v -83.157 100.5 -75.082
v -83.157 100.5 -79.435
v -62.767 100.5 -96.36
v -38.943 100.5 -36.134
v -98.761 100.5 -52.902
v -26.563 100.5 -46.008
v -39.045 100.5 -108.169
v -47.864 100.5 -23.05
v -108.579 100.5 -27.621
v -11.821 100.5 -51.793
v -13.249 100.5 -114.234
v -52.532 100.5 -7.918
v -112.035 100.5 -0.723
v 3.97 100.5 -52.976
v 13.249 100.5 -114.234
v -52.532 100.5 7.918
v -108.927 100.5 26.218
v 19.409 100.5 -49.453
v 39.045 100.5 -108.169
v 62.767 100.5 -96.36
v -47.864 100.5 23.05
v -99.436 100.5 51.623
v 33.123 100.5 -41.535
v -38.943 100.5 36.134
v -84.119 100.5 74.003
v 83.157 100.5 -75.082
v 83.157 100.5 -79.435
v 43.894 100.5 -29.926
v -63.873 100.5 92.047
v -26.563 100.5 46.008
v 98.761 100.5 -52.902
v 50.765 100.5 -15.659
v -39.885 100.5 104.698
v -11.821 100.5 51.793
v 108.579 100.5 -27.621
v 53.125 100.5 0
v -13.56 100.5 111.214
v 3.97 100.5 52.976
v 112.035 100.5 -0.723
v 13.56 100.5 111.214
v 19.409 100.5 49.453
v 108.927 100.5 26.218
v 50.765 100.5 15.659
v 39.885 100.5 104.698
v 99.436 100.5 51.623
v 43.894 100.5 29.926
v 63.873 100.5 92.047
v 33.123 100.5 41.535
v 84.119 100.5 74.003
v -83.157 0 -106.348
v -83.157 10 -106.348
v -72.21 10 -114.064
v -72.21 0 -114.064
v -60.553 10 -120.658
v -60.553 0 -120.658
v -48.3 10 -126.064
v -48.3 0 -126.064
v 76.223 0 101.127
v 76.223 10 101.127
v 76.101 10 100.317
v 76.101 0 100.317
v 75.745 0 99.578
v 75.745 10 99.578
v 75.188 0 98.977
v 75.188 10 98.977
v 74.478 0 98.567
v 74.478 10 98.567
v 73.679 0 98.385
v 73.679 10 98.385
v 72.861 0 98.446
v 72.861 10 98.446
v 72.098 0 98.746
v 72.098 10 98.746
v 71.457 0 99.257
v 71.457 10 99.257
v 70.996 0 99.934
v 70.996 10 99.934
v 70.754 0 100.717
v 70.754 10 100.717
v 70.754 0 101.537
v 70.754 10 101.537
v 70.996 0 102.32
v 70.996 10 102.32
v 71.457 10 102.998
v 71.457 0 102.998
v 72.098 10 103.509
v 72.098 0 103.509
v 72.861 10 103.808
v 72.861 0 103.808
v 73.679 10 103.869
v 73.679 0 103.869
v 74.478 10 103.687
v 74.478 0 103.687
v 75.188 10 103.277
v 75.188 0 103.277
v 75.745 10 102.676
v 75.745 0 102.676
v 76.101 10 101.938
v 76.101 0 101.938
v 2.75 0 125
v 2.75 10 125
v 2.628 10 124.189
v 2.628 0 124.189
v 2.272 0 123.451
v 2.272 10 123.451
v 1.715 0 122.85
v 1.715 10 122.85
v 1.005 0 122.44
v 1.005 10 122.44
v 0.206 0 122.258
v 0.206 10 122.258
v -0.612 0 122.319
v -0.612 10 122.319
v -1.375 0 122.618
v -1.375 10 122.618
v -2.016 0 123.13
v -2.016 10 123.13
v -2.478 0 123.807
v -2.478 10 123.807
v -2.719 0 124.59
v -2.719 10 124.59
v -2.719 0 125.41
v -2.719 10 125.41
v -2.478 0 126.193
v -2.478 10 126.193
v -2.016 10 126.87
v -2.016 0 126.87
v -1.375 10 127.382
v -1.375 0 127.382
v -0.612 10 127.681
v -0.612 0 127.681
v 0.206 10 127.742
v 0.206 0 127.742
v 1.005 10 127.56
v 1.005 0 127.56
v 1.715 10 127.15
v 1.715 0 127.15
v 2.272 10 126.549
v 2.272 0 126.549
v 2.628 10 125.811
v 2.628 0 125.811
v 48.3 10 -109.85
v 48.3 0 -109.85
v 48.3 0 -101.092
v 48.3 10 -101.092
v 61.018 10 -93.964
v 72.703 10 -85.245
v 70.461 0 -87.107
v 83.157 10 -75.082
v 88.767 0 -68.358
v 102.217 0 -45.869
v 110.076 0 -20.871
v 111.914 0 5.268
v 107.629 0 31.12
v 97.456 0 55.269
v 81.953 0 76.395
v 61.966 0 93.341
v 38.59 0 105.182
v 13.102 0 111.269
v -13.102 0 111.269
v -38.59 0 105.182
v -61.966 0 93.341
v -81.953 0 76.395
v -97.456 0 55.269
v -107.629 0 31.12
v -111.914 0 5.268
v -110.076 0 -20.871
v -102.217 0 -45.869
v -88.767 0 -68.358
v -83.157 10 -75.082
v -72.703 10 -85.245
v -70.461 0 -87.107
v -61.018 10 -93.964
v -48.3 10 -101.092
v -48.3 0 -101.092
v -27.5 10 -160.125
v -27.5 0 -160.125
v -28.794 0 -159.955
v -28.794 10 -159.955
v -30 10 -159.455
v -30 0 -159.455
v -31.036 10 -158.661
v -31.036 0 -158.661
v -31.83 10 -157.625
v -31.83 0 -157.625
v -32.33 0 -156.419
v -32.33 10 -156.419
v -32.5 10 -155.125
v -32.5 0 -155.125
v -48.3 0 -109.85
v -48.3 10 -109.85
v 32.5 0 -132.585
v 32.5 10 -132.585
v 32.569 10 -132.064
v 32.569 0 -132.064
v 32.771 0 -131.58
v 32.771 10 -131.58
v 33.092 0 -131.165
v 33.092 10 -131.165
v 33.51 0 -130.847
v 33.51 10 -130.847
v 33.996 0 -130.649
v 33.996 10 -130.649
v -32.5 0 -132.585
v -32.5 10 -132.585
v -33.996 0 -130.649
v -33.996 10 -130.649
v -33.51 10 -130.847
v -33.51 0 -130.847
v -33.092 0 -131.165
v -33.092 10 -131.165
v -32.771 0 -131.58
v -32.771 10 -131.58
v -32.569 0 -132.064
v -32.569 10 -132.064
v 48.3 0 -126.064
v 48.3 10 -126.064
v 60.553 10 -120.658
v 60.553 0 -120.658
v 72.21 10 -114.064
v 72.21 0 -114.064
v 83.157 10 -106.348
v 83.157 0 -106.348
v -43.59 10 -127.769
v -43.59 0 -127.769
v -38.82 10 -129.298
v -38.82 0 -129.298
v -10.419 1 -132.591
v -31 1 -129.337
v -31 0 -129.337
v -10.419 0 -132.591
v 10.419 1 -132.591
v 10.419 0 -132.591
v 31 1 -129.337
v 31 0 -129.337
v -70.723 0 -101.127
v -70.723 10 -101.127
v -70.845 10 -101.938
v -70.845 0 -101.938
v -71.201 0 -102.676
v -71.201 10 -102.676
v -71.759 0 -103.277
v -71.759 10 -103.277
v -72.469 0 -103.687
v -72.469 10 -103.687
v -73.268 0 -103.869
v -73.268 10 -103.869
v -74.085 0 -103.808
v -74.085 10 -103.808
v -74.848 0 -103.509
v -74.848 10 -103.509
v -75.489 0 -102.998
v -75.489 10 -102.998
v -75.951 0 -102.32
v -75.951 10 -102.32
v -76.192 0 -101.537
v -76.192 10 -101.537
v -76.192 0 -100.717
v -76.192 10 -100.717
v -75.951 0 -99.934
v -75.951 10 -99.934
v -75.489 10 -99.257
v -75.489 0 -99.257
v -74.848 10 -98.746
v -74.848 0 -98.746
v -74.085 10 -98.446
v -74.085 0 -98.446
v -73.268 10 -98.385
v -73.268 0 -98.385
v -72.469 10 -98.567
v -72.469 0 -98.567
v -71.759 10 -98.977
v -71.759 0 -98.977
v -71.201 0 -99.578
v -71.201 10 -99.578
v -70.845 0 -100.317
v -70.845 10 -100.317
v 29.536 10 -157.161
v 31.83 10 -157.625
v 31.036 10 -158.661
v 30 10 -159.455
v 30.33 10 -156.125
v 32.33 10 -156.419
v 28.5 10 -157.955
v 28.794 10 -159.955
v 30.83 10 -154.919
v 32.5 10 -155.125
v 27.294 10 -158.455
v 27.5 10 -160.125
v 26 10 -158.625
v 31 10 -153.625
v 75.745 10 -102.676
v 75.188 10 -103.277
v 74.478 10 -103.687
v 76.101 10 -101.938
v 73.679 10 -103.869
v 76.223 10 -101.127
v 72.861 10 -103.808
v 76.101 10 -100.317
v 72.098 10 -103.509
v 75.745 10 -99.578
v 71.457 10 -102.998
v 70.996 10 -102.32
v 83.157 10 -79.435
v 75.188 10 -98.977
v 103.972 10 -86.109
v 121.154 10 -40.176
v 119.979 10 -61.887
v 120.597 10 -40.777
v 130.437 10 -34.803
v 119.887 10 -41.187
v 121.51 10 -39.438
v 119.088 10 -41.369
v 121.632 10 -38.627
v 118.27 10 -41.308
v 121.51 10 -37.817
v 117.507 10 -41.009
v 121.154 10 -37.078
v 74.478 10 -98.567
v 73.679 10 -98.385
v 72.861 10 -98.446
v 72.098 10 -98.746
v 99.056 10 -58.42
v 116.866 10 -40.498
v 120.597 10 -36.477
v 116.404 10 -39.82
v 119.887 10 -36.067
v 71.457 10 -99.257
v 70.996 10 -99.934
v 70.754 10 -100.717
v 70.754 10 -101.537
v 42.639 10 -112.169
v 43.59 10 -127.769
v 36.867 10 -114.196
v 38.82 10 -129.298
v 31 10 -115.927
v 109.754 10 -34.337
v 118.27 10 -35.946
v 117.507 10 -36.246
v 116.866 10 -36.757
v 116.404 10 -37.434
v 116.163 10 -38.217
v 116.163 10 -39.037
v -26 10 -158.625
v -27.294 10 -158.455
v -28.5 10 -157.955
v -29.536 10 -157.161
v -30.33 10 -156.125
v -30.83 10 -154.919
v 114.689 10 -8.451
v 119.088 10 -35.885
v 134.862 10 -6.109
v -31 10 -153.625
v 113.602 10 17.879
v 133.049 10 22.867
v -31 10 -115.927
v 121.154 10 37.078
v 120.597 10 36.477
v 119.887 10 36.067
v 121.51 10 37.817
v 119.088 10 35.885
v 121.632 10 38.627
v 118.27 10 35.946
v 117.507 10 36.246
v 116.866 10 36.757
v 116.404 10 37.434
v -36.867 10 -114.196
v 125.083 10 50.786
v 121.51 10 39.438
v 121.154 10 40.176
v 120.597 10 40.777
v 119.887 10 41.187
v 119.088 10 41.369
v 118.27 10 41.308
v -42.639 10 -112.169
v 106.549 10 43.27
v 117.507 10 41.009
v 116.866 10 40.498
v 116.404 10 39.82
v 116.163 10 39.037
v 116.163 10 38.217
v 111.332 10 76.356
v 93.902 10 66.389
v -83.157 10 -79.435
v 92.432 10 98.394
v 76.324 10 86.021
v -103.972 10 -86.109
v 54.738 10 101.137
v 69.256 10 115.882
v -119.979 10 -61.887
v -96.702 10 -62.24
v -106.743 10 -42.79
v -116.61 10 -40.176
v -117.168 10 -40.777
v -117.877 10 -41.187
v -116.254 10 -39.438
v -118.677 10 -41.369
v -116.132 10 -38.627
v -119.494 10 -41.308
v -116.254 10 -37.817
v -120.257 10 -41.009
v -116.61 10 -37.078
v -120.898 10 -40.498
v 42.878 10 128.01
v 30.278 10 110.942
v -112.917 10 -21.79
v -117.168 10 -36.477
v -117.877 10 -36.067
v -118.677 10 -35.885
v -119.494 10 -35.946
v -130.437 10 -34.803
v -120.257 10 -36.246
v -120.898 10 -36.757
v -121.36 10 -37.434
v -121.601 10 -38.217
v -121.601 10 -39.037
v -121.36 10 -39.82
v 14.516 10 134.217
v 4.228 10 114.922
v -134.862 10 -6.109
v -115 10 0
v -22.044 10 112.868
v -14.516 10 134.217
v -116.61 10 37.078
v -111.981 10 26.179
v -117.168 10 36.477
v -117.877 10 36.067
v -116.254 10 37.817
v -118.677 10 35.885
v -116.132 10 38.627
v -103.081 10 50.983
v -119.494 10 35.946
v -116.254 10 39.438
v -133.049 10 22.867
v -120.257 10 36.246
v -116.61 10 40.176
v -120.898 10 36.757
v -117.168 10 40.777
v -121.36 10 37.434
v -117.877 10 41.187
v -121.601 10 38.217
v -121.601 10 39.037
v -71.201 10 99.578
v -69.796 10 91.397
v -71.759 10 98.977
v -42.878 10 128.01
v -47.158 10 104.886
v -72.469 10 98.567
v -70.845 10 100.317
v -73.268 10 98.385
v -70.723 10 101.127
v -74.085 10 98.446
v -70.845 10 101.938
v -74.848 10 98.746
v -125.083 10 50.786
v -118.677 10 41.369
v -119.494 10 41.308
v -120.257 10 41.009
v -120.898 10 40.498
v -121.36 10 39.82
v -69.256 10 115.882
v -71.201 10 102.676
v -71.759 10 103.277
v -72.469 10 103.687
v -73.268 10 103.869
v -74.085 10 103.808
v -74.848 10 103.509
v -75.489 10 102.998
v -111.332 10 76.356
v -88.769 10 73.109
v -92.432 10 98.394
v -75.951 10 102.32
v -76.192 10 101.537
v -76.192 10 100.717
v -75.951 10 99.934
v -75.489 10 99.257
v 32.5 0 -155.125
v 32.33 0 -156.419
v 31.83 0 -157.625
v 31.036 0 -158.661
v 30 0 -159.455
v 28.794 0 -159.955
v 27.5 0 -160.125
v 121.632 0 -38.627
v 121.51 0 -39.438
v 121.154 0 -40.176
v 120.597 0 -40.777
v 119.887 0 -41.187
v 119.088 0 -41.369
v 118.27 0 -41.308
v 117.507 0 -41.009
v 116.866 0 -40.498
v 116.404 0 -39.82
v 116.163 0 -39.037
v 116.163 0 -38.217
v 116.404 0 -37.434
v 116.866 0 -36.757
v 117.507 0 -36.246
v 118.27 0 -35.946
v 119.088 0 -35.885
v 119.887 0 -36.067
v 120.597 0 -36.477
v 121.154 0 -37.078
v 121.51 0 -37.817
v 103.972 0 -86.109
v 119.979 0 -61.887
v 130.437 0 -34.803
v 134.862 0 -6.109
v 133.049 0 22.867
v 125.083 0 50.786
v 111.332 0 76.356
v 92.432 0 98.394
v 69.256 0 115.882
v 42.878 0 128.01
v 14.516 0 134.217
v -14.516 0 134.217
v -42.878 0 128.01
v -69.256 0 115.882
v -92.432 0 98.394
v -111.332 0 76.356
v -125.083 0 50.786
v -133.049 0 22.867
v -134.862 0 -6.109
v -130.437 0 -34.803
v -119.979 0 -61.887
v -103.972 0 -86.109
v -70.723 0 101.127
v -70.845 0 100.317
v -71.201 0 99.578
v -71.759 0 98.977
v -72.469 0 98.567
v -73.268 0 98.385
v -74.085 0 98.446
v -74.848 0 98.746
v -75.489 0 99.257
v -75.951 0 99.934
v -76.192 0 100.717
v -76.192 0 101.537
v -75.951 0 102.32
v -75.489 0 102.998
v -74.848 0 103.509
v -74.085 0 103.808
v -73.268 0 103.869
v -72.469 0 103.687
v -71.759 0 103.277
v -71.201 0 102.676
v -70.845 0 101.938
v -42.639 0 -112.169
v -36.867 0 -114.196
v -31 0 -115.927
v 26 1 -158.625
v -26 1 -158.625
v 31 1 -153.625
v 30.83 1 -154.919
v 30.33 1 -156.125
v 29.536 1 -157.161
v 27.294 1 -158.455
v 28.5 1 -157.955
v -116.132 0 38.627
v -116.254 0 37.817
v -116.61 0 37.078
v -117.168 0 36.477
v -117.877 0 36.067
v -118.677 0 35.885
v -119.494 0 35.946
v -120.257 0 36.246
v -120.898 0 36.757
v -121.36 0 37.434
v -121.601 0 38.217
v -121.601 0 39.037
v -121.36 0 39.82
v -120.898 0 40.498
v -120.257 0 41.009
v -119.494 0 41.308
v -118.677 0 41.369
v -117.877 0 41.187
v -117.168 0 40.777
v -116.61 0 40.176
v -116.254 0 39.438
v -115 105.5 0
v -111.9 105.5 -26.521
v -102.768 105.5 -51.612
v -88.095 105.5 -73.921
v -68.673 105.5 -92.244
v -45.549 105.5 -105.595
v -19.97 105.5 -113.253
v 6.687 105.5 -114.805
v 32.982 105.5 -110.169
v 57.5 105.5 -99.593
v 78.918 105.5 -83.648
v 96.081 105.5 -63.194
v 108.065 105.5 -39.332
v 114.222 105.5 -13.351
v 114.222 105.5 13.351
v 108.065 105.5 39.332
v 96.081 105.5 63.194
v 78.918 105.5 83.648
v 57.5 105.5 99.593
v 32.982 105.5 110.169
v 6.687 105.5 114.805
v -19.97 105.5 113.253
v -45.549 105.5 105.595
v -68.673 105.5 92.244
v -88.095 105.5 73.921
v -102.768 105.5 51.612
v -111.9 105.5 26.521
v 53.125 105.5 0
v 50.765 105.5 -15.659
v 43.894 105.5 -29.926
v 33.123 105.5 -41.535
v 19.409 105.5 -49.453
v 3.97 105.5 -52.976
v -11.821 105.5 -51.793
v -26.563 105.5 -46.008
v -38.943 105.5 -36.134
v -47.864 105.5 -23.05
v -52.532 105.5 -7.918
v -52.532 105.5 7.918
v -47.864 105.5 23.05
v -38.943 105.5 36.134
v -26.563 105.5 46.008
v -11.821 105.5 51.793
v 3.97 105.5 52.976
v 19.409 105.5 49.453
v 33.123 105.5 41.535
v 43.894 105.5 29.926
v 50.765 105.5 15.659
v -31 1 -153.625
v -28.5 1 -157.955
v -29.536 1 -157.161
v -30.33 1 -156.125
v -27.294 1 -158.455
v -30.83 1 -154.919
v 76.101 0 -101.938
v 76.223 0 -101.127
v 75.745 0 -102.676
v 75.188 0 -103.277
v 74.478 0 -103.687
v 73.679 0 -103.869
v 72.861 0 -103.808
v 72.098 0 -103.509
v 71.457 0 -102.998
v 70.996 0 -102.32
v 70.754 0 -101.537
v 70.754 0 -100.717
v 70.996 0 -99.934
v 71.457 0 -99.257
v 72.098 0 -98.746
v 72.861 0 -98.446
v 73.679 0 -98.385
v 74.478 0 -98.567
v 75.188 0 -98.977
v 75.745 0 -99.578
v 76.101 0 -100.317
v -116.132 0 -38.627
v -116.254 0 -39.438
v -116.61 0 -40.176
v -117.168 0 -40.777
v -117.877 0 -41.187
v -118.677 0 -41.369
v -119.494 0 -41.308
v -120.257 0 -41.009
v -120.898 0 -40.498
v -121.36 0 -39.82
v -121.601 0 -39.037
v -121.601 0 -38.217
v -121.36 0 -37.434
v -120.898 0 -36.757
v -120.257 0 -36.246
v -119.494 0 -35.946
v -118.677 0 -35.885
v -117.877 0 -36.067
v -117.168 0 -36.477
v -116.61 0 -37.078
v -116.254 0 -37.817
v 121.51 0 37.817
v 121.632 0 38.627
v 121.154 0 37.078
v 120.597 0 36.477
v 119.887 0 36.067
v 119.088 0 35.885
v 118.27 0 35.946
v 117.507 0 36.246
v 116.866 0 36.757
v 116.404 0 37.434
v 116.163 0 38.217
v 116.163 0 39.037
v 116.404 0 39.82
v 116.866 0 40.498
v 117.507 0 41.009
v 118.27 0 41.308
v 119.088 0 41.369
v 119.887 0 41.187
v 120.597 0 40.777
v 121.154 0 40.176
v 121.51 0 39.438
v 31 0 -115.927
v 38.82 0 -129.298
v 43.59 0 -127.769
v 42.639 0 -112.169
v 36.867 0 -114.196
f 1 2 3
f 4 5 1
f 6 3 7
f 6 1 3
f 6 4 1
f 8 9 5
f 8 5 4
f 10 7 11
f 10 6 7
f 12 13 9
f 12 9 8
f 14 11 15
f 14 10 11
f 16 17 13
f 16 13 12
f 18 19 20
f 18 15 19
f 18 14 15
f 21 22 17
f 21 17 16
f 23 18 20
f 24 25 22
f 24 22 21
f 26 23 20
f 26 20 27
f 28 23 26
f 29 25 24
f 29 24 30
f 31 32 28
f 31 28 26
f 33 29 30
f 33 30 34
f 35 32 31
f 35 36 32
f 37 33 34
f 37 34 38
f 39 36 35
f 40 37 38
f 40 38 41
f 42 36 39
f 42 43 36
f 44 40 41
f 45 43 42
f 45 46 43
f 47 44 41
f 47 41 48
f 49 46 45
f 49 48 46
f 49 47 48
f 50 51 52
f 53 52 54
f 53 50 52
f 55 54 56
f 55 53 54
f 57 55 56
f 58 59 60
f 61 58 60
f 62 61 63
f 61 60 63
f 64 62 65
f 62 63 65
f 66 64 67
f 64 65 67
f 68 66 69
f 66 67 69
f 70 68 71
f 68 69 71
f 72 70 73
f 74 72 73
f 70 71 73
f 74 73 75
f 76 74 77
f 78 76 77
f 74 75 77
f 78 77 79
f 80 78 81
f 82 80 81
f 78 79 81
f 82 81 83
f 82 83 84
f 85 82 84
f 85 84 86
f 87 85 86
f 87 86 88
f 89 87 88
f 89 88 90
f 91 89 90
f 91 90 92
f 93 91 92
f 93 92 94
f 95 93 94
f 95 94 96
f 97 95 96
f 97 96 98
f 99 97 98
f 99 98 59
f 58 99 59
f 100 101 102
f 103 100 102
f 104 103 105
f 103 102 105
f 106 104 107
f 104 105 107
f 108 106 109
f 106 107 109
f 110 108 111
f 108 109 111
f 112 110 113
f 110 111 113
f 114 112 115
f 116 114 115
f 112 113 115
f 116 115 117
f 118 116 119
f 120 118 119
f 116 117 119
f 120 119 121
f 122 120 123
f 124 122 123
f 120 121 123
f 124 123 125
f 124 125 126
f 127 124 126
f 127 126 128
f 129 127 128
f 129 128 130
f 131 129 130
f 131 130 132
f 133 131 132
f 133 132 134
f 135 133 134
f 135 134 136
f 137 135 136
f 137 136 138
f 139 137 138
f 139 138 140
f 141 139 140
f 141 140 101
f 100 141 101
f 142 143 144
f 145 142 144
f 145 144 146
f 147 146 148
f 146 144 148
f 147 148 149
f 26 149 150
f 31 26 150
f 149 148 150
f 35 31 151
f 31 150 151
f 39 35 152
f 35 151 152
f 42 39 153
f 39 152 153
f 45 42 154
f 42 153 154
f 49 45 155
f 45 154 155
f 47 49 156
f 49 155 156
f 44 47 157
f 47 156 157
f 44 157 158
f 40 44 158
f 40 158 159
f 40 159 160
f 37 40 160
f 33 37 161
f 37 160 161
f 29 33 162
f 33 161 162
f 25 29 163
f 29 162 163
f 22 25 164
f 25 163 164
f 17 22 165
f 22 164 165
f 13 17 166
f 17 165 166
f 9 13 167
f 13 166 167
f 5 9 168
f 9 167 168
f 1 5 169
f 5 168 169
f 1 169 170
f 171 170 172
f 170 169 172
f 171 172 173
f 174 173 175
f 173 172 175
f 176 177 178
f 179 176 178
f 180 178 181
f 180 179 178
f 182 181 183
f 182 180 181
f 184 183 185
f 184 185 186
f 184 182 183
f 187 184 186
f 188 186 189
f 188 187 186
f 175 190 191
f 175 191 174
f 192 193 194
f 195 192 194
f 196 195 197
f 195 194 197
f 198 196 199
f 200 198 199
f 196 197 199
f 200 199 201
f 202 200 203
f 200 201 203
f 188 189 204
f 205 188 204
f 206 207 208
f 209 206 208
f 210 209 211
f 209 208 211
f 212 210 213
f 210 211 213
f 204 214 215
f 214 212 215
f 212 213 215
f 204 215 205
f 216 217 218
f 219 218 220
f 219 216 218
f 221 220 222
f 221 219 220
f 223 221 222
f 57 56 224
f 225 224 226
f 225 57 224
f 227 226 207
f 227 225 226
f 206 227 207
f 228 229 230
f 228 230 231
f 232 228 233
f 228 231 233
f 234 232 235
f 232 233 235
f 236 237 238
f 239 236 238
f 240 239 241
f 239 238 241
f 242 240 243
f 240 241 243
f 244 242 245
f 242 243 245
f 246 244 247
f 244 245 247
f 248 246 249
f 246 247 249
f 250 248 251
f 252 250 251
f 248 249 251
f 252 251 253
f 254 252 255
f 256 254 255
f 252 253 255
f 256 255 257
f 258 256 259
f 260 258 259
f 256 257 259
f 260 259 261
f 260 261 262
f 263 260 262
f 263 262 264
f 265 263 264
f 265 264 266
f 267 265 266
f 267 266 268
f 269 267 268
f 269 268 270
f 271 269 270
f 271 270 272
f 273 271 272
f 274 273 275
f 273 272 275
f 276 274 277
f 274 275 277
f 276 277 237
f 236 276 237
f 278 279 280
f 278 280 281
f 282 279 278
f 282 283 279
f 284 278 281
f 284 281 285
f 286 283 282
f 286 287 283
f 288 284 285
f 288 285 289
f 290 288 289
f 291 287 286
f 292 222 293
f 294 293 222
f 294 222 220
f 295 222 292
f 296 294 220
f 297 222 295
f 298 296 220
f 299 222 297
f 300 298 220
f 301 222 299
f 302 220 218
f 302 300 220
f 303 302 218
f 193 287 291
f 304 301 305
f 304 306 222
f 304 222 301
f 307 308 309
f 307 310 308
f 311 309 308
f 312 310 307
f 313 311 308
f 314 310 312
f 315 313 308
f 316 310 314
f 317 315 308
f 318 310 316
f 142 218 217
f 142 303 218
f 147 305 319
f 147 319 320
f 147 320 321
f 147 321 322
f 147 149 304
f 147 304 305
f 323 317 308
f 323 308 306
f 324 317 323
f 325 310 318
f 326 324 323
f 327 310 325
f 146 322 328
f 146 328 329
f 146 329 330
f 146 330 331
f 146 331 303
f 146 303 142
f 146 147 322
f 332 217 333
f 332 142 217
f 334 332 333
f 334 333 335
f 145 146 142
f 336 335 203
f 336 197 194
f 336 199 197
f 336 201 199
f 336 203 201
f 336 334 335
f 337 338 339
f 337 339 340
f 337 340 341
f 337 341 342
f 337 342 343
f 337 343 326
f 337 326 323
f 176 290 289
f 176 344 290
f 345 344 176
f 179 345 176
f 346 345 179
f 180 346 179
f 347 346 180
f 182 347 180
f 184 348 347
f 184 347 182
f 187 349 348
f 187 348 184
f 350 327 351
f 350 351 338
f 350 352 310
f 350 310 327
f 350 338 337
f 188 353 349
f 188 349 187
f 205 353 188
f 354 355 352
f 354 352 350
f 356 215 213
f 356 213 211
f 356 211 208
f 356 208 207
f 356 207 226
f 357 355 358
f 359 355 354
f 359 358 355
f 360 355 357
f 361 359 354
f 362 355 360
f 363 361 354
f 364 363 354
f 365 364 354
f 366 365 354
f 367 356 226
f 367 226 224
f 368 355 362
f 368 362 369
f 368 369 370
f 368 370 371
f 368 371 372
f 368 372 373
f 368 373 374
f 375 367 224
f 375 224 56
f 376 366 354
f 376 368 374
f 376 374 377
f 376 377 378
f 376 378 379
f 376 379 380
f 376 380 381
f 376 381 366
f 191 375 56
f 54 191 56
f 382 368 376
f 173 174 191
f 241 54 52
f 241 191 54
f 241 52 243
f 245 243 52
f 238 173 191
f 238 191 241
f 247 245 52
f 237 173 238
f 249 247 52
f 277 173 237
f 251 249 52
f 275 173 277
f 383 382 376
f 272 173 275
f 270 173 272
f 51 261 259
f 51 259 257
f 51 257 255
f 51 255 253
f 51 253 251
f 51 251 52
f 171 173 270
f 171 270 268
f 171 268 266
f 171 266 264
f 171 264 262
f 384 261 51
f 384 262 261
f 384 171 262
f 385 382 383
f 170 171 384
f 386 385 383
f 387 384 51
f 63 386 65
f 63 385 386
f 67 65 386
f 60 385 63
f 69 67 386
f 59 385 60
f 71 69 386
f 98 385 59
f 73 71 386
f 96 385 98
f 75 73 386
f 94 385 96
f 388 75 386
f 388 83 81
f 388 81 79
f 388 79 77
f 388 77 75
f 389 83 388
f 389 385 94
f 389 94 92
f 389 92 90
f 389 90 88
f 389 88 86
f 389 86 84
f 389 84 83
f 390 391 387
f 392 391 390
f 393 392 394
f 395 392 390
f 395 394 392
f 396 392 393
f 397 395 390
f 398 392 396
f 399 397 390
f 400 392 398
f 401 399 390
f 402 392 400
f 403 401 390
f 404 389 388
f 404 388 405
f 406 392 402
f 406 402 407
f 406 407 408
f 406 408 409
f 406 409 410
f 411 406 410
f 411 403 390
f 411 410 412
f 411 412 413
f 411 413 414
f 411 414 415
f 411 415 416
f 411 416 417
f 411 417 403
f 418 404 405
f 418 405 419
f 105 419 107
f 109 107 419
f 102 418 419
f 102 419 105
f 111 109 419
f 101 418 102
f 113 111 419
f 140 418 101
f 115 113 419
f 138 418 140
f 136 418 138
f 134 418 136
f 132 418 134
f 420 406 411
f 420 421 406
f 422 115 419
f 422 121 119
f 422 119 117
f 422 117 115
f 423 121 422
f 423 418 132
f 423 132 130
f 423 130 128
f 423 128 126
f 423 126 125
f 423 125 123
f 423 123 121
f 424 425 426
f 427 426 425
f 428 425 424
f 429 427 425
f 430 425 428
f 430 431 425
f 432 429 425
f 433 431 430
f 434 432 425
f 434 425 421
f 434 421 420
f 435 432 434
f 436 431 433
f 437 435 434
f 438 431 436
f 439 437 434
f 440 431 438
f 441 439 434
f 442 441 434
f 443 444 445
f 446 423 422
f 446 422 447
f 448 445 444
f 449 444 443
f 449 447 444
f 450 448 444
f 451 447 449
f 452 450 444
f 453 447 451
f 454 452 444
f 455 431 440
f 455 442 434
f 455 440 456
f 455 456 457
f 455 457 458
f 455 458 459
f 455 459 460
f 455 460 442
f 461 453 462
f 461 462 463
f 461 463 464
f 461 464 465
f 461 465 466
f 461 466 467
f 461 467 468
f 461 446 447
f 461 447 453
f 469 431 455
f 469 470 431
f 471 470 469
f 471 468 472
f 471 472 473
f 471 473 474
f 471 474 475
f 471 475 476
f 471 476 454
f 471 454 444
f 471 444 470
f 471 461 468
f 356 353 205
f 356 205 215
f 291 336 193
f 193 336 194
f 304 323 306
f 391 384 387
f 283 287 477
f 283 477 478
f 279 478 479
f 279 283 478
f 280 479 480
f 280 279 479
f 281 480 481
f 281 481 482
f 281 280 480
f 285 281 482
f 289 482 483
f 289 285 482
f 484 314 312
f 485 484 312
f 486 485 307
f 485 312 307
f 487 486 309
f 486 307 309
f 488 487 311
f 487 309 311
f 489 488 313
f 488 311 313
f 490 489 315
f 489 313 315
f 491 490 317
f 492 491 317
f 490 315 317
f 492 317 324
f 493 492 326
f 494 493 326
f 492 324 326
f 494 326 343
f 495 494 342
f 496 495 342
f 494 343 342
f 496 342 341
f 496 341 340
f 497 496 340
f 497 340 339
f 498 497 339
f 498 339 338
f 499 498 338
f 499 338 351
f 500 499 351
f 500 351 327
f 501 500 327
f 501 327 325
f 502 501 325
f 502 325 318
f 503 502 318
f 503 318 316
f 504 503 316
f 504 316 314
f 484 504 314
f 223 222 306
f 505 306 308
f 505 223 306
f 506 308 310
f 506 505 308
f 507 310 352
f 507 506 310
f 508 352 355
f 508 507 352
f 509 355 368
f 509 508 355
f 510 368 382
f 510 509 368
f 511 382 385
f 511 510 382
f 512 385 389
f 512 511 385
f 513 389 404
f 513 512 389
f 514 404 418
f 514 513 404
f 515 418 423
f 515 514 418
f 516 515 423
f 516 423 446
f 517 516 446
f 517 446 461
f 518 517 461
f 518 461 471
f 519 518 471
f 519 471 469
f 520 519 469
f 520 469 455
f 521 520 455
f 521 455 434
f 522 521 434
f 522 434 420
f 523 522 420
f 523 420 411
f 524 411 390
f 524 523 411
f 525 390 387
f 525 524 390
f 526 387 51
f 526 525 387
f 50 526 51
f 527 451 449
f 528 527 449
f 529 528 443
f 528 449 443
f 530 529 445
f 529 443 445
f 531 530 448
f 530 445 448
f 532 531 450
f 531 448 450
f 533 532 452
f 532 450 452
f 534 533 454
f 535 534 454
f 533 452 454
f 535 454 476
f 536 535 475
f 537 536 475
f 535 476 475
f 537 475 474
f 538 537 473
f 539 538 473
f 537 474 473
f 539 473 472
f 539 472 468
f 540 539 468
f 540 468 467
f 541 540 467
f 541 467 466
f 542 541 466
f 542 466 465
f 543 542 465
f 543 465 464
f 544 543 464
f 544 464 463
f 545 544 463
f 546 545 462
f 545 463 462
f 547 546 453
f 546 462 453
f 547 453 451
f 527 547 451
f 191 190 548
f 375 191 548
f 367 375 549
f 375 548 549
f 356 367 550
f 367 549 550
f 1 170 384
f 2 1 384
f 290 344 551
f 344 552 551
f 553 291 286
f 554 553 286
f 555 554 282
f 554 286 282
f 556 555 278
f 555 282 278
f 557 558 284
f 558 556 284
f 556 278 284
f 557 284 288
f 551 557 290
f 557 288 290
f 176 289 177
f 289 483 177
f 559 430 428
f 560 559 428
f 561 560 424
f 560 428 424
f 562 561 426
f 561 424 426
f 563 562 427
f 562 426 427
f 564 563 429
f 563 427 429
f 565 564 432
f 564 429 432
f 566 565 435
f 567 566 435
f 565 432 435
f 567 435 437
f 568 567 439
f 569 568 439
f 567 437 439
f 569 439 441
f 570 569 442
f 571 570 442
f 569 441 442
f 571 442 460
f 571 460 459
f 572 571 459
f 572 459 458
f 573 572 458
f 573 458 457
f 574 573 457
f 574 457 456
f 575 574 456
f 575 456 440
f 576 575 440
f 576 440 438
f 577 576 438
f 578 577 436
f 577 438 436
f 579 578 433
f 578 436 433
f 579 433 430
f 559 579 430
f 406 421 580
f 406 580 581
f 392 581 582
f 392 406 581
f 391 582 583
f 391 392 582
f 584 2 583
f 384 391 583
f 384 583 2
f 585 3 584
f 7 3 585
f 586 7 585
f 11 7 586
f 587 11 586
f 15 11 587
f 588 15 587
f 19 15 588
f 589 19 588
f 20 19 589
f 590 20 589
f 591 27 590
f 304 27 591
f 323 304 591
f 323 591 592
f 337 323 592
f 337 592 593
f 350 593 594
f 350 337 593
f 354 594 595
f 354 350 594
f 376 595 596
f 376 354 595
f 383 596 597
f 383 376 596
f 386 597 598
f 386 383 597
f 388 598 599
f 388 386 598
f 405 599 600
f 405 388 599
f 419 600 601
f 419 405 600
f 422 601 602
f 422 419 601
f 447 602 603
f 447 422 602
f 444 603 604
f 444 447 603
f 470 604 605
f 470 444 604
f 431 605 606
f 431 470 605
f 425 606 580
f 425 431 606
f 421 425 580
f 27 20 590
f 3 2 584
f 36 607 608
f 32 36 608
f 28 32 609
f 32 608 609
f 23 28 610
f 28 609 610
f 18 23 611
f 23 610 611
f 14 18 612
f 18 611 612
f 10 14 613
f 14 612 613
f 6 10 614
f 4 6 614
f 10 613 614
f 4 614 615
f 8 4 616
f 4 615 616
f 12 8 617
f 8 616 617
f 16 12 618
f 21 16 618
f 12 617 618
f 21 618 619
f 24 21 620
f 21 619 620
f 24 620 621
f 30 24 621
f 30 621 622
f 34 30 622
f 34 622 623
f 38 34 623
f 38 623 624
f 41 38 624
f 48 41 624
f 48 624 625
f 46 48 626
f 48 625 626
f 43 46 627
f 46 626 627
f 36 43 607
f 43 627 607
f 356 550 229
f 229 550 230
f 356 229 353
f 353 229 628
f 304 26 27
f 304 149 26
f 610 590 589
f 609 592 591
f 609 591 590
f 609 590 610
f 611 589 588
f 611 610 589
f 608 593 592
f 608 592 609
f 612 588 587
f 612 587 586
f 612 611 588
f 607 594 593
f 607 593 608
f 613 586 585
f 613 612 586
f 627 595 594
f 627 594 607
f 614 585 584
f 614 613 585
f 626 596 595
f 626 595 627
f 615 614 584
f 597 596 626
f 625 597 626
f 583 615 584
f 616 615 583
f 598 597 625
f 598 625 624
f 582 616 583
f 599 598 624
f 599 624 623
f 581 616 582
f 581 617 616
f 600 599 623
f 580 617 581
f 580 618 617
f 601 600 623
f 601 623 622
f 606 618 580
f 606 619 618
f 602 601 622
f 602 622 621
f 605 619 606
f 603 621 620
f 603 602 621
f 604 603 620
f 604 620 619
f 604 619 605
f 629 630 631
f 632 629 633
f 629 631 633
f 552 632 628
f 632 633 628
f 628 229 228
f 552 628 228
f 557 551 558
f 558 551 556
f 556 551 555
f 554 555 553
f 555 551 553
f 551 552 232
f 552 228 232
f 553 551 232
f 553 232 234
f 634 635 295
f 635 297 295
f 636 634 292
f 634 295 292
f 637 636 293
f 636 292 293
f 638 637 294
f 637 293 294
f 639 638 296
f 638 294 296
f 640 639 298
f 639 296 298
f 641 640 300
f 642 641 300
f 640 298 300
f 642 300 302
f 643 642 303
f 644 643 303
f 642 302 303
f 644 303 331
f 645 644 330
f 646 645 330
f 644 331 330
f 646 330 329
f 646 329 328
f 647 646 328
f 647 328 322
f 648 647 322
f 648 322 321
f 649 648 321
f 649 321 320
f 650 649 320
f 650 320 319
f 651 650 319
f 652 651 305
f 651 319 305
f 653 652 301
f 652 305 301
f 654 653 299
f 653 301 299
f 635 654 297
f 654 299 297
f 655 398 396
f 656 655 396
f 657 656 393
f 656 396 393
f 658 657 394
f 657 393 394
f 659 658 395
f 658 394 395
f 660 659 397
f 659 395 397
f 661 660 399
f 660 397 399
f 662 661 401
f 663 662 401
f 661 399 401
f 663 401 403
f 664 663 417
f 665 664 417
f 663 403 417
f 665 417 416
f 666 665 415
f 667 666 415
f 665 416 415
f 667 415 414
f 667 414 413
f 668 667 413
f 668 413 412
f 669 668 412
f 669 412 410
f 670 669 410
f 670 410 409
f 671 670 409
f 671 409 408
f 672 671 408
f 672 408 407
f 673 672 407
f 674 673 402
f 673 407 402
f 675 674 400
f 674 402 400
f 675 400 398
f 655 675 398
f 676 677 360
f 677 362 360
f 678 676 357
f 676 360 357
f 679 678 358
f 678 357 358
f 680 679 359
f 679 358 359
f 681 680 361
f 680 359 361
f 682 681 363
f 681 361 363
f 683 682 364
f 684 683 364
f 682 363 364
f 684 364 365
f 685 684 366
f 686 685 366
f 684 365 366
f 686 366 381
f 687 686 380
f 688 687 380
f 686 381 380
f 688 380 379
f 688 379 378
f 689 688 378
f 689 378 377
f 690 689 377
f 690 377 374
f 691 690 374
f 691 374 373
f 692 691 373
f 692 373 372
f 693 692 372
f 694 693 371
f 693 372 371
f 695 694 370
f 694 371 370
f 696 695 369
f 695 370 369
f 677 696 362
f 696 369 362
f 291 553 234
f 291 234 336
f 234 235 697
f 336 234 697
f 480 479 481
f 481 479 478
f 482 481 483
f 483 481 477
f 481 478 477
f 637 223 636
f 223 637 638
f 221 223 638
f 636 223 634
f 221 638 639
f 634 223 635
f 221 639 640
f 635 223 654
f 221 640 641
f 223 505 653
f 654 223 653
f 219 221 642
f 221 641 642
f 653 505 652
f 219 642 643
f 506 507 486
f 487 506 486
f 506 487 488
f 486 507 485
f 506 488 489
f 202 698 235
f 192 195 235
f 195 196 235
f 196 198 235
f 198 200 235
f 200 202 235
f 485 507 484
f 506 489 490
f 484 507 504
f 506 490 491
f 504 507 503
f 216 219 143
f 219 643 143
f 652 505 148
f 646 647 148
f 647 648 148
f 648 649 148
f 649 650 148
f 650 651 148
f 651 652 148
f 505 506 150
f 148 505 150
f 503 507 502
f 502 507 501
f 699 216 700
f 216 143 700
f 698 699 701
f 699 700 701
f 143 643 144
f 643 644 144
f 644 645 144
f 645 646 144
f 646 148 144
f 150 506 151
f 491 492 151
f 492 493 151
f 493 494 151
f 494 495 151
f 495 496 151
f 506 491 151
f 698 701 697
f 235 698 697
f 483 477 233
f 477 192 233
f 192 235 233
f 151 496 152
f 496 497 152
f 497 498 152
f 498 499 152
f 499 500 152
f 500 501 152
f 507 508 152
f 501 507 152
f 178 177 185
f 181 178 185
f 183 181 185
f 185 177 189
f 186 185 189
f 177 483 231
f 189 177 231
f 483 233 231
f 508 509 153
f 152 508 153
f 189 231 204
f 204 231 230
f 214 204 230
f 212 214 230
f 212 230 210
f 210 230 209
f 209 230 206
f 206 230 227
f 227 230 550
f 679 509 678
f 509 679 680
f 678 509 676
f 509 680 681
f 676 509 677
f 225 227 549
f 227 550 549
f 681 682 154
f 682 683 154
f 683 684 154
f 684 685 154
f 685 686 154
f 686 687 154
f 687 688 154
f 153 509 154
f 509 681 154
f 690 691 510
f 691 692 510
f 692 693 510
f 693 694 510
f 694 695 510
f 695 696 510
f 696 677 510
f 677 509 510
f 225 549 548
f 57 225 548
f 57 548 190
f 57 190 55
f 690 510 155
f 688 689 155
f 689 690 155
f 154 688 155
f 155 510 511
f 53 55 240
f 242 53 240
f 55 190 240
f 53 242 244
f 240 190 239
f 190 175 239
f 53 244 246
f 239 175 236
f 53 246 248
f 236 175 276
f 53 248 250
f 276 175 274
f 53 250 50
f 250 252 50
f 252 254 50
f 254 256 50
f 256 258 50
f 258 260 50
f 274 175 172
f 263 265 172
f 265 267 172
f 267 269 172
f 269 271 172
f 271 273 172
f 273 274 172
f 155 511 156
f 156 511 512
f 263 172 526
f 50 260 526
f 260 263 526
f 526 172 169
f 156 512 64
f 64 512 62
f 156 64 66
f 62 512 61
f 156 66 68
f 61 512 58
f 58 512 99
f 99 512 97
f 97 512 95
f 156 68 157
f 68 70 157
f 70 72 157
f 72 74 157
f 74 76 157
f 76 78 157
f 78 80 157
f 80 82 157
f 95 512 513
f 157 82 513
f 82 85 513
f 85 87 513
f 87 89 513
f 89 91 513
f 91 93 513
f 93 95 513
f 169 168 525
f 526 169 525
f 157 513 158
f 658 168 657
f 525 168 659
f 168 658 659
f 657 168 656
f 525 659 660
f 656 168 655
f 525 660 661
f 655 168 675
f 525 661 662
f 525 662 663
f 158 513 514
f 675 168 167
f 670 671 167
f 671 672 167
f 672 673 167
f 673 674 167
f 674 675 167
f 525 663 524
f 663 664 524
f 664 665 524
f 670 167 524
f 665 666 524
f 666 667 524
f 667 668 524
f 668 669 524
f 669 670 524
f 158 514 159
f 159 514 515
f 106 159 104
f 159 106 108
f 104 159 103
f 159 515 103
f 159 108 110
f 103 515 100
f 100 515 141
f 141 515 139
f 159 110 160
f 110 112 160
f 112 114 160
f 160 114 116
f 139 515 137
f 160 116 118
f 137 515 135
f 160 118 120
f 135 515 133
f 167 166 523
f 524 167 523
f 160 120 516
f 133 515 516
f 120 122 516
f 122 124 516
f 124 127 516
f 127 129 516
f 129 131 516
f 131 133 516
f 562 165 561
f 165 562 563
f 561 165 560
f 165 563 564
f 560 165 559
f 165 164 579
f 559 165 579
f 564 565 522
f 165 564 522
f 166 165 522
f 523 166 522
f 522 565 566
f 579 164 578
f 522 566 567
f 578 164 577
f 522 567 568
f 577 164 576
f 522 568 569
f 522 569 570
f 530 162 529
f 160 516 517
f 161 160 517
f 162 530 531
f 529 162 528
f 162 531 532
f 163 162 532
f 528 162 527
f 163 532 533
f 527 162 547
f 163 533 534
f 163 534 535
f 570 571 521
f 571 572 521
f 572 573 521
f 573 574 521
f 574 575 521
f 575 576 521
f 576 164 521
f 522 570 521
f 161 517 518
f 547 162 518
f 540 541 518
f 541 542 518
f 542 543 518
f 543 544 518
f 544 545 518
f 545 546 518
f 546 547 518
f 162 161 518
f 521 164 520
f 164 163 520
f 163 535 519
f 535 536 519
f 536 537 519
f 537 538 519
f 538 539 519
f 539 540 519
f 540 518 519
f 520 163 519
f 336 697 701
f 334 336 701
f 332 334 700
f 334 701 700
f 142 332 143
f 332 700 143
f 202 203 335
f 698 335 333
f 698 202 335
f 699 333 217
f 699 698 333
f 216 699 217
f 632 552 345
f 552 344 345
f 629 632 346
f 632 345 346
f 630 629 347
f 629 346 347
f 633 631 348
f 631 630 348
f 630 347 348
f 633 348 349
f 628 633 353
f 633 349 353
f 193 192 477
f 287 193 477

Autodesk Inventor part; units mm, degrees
ref_plane "YZ Plane" through (0, 0, 0) normal (1, 0, 0) x (0, 1, 0)
ref_plane "XZ Plane" through (0, 0, 0) normal (0, 1, 0) x (-1, 0, 0)
ref_plane "XY Plane" through (0, 0, 0) normal (0, 0, 1) x (1, 0, 0)
sketch "Sketch1" plane through (0, 0, 0) normal (0, 1, 0) x (-1, 0, 0)
  circle A0 centre (0, 0) radius 135
  circle A1 centre (0, 0) radius 115
  circle A2 centre (0, 0) radius 112.0375
  circle A3 centre (0, 0) radius 9.5
  dimension "Absolute_Diameter" = 270
  dimension "Diameter_No_Outer_Lip" = 230
  dimension "Inner_Cylinder_Diameter" = 224.075
  dimension "Lip_Diameter" = 19
extrude "Extrusion1" add sketch "Sketch1" along normal blind 10 contours A0
extrude "Extrusion2" add sketch "Sketch1" along normal blind 105.5 contours A1
sketch "Sketch2" plane through (0, 105.5, 0) normal (0, 1, 0) x (1, 0, 0)
  circle A0 centre (0, 0) radius 115
  circle A1 centre (0, 0) radius 53.125
  dimension "Lip_Diameter_Out" = 230
  dimension "Inner_Lip_Diameter" = 106.25
extrude "Extrusion7" add sketch "Sketch2" against normal blind 5
sketch "Sketch24" plane through (0, 0, 0) normal (0, -1, 0) x (1, 0, 0)
  circle A0 centre (0, 0) radius 112.0375
  arc A1 (-85.157, -104.7535) -> (32.5, -131.0296) centre (0, 0) ccw
  circle A2 centre (0, 0) radius 133
  line L0 (-32.5, -70.125) -> (32.5, -70.125)
  line L1 (32.5, -70.125) -> (32.5, -160.125)
  line L2 (32.5, -160.125) -> (-32.5, -160.125)
  line L3 (-32.5, -160.125) -> (-32.5, -70.125)
  line L4 (-31, -158.625) -> (31, -158.625)
  line L5 (31, -158.625) -> (31, -71.625)
  line L6 (31, -71.625) -> (-31, -71.625)
  line L7 (-31, -71.625) -> (-31, -158.625)
  line L8 (-85.157, -65.125) -> (-46.3, -65.125)
  line L9 (-46.3, -65.125) -> (-46.3, -151.2985)
  line L10 (-46.3, -151.2985) -> (-85.157, -151.2985)
  line L11 (-85.157, -151.2985) -> (-85.157, -65.125)
  arc A3 (32.5, -131.0296) -> (-85.157, -104.7535) centre (0, 0) ccw
  line L12 (0, -71.625) -> (0, -158.625)
  line L13 (-83.157, -149.2985) -> (-48.3, -149.2985)
  line L14 (-48.3, -149.2985) -> (-48.3, -67.125)
  line L15 (-48.3, -67.125) -> (-83.157, -67.125)
  line L16 (-83.157, -67.125) -> (-83.157, -149.2985)
  line L17 (85.157, -65.125) -> (46.3, -65.125)
  line L18 (46.3, -65.125) -> (46.3, -151.2985)
  line L19 (46.3, -151.2985) -> (85.157, -151.2985)
  line L20 (85.157, -151.2985) -> (85.157, -65.125)
  line L21 (83.157, -149.2985) -> (48.3, -149.2985)
  line L22 (48.3, -149.2985) -> (48.3, -67.125)
  line L23 (48.3, -67.125) -> (83.157, -67.125)
  line L24 (83.157, -67.125) -> (83.157, -149.2985)
  circle A4 centre (0, 0) radius 120
  line L25 (-135, 0) -> (135, 0)
  point P0 (0, -135)
  point P1 (48.3, -126.0639)
  point P2 (83.157, -106.3481)
  point P3 (-31, -131.3925)
  point P4 (31, -131.3925)
  point P5 (-83.157, -106.3481)
  point P6 (-48.3, -126.0639)
  point P7 (46.3, -126.8121)
  point P8 (85.157, -104.7535)
  point P9 (-32.5, -131.0296)
  point P10 (-46.3, -126.8121)
  point P11 (48.3, -109.8504)
  point P12 (48.3, -101.0916)
  point P13 (31, -107.6634)
  point P14 (31, -115.9267)
  point P15 (-48.3, -109.8504)
  point P16 (-31, -115.9267)
  point P17 (-31, -107.6634)
  point P18 (-48.3, -101.0916)
  point P19 (83.157, -75.0821)
  point P20 (-83.157, -75.0821)
  point P21 (32.5, -115.5152)
  point P22 (-32.5, -115.5152)
  point P23 (31, -129.3368)
  point P24 (-31, -129.3368)
  dimension "d234" = 2
  dimension "d235" = 65
  dimension "d237" = 1.5
  dimension "d238" = 65.125
  dimension "d240" = 20.9625
  dimension "d241" = 270
  dimension "d242" = 70.125
  dimension "d243" = 13.8
  dimension "d244" = 38.857
  dimension "d247" = 2
  dimension "d248" = 90
  dimension "d253" = 240
extrude "Extrusion30" cut sketch "Sketch24" against normal up to surface (100.5 mm away) contours L24 A4 L22 A0 | A0 L22 L23 L24 | L16 L15 L14 A0 | A0 L14 A4 L16 | L24 A2 L22 A4 | A4 L14 A2 L16 | L24 A3 L22 A2 | A2 L14 A1 L16 | L5 A4 L12 A0 | A0 L12 L6 L5 | L7 L6 L12 A0 | A0 L12 A4 L7 | L5 A2 L12 A4 | A4 L12 A2 L7 | L5 A1 L12 A2 | A2 L12 A1 L7
extrude "Extrusion31" add sketch "Sketch24" against normal up to surface (10 mm away) contours L24 A4 L22 A0 | A0 L14 A4 L16 | L24 A2 L22 A4 | A4 L14 A2 L16 | L24 A3 L22 A2 | A2 L14 A1 L16 | L1 L2 L3 A1 L7 L4 L5
extrude "Extrusion32" cut sketch "Sketch24" against normal up to surface (100.5 mm away) contours L22 A4 L18 A0 | A0 L9 A4 L14 | L18 A4 L1 A0 | A0 L3 A4 L9 | L1 A4 L5 A0 | A0 L7 A4 L3
extrude "Extrusion35" add sketch "Sketch24" against normal blind 1 contours L1 A2 L5 A4 | A4 L7 A2 L3 | L1 A1 L5 A2 | A2 L7 A1 L3 | L5 A1 L12 A2 | L1 L2 L3 A1 L7 L4 L5 | A2 L12 A1 L7 | L5 L4 L12 A1 | A1 L12 L4 L7
fillet "Fillet19" radius 5 4 edges at (32.5, 0.5, -160.125) (31, 5.5, -158.625) (-32.5, 0.5, -160.125) (-31, 5.5, -158.625)
fillet "Fillet20" radius 2 4 edges at (-32.5, 5.5, -131.0296) (-32.5, 0.5, -131.0296) (32.5, 5.5, -131.0296) (32.5, 0.5, -131.0296)
sketch "Sketch27" plane through (0, 10, 0) normal (0, 1, 0) x (1, 0, 0)
  circle A0 centre (0, 0) radius 125
  circle A1 centre (0, 125) radius 2.75
  circle A2 centre (-73.4732, 101.1271) radius 2.75
  circle A3 centre (-118.8821, 38.6271) radius 2.75
  circle A4 centre (-118.8821, -38.6271) radius 2.75
  circle A5 centre (-73.4732, -101.1271) radius 2.75
  circle A6 centre (0, -125) radius 2.75
  circle A7 centre (73.4732, -101.1271) radius 2.75
  circle A8 centre (118.8821, -38.6271) radius 2.75
  circle A9 centre (118.8821, 38.6271) radius 2.75
  circle A10 centre (73.4732, 101.1271) radius 2.75
  dimension "d276" = 250
  dimension "d277" = 5.5
  dimension "d280" = 360
extrude "Extrusion36" cut sketch "Sketch27" against normal blind 10 contours A9 A0 | A0 A9 | A8 A0 | A0 A8 | A10 A0 | A0 A10 | A7 A0 | A0 A7 | A1 A0 | A0 A1 | A6 A0 | A0 A6 | A2 A0 | A0 A2 | A5 A0 | A0 A5 | A3 A0 | A0 A3 | A4 A0 | A0 A4
properties part number "Cylinder  Segment - 01"
